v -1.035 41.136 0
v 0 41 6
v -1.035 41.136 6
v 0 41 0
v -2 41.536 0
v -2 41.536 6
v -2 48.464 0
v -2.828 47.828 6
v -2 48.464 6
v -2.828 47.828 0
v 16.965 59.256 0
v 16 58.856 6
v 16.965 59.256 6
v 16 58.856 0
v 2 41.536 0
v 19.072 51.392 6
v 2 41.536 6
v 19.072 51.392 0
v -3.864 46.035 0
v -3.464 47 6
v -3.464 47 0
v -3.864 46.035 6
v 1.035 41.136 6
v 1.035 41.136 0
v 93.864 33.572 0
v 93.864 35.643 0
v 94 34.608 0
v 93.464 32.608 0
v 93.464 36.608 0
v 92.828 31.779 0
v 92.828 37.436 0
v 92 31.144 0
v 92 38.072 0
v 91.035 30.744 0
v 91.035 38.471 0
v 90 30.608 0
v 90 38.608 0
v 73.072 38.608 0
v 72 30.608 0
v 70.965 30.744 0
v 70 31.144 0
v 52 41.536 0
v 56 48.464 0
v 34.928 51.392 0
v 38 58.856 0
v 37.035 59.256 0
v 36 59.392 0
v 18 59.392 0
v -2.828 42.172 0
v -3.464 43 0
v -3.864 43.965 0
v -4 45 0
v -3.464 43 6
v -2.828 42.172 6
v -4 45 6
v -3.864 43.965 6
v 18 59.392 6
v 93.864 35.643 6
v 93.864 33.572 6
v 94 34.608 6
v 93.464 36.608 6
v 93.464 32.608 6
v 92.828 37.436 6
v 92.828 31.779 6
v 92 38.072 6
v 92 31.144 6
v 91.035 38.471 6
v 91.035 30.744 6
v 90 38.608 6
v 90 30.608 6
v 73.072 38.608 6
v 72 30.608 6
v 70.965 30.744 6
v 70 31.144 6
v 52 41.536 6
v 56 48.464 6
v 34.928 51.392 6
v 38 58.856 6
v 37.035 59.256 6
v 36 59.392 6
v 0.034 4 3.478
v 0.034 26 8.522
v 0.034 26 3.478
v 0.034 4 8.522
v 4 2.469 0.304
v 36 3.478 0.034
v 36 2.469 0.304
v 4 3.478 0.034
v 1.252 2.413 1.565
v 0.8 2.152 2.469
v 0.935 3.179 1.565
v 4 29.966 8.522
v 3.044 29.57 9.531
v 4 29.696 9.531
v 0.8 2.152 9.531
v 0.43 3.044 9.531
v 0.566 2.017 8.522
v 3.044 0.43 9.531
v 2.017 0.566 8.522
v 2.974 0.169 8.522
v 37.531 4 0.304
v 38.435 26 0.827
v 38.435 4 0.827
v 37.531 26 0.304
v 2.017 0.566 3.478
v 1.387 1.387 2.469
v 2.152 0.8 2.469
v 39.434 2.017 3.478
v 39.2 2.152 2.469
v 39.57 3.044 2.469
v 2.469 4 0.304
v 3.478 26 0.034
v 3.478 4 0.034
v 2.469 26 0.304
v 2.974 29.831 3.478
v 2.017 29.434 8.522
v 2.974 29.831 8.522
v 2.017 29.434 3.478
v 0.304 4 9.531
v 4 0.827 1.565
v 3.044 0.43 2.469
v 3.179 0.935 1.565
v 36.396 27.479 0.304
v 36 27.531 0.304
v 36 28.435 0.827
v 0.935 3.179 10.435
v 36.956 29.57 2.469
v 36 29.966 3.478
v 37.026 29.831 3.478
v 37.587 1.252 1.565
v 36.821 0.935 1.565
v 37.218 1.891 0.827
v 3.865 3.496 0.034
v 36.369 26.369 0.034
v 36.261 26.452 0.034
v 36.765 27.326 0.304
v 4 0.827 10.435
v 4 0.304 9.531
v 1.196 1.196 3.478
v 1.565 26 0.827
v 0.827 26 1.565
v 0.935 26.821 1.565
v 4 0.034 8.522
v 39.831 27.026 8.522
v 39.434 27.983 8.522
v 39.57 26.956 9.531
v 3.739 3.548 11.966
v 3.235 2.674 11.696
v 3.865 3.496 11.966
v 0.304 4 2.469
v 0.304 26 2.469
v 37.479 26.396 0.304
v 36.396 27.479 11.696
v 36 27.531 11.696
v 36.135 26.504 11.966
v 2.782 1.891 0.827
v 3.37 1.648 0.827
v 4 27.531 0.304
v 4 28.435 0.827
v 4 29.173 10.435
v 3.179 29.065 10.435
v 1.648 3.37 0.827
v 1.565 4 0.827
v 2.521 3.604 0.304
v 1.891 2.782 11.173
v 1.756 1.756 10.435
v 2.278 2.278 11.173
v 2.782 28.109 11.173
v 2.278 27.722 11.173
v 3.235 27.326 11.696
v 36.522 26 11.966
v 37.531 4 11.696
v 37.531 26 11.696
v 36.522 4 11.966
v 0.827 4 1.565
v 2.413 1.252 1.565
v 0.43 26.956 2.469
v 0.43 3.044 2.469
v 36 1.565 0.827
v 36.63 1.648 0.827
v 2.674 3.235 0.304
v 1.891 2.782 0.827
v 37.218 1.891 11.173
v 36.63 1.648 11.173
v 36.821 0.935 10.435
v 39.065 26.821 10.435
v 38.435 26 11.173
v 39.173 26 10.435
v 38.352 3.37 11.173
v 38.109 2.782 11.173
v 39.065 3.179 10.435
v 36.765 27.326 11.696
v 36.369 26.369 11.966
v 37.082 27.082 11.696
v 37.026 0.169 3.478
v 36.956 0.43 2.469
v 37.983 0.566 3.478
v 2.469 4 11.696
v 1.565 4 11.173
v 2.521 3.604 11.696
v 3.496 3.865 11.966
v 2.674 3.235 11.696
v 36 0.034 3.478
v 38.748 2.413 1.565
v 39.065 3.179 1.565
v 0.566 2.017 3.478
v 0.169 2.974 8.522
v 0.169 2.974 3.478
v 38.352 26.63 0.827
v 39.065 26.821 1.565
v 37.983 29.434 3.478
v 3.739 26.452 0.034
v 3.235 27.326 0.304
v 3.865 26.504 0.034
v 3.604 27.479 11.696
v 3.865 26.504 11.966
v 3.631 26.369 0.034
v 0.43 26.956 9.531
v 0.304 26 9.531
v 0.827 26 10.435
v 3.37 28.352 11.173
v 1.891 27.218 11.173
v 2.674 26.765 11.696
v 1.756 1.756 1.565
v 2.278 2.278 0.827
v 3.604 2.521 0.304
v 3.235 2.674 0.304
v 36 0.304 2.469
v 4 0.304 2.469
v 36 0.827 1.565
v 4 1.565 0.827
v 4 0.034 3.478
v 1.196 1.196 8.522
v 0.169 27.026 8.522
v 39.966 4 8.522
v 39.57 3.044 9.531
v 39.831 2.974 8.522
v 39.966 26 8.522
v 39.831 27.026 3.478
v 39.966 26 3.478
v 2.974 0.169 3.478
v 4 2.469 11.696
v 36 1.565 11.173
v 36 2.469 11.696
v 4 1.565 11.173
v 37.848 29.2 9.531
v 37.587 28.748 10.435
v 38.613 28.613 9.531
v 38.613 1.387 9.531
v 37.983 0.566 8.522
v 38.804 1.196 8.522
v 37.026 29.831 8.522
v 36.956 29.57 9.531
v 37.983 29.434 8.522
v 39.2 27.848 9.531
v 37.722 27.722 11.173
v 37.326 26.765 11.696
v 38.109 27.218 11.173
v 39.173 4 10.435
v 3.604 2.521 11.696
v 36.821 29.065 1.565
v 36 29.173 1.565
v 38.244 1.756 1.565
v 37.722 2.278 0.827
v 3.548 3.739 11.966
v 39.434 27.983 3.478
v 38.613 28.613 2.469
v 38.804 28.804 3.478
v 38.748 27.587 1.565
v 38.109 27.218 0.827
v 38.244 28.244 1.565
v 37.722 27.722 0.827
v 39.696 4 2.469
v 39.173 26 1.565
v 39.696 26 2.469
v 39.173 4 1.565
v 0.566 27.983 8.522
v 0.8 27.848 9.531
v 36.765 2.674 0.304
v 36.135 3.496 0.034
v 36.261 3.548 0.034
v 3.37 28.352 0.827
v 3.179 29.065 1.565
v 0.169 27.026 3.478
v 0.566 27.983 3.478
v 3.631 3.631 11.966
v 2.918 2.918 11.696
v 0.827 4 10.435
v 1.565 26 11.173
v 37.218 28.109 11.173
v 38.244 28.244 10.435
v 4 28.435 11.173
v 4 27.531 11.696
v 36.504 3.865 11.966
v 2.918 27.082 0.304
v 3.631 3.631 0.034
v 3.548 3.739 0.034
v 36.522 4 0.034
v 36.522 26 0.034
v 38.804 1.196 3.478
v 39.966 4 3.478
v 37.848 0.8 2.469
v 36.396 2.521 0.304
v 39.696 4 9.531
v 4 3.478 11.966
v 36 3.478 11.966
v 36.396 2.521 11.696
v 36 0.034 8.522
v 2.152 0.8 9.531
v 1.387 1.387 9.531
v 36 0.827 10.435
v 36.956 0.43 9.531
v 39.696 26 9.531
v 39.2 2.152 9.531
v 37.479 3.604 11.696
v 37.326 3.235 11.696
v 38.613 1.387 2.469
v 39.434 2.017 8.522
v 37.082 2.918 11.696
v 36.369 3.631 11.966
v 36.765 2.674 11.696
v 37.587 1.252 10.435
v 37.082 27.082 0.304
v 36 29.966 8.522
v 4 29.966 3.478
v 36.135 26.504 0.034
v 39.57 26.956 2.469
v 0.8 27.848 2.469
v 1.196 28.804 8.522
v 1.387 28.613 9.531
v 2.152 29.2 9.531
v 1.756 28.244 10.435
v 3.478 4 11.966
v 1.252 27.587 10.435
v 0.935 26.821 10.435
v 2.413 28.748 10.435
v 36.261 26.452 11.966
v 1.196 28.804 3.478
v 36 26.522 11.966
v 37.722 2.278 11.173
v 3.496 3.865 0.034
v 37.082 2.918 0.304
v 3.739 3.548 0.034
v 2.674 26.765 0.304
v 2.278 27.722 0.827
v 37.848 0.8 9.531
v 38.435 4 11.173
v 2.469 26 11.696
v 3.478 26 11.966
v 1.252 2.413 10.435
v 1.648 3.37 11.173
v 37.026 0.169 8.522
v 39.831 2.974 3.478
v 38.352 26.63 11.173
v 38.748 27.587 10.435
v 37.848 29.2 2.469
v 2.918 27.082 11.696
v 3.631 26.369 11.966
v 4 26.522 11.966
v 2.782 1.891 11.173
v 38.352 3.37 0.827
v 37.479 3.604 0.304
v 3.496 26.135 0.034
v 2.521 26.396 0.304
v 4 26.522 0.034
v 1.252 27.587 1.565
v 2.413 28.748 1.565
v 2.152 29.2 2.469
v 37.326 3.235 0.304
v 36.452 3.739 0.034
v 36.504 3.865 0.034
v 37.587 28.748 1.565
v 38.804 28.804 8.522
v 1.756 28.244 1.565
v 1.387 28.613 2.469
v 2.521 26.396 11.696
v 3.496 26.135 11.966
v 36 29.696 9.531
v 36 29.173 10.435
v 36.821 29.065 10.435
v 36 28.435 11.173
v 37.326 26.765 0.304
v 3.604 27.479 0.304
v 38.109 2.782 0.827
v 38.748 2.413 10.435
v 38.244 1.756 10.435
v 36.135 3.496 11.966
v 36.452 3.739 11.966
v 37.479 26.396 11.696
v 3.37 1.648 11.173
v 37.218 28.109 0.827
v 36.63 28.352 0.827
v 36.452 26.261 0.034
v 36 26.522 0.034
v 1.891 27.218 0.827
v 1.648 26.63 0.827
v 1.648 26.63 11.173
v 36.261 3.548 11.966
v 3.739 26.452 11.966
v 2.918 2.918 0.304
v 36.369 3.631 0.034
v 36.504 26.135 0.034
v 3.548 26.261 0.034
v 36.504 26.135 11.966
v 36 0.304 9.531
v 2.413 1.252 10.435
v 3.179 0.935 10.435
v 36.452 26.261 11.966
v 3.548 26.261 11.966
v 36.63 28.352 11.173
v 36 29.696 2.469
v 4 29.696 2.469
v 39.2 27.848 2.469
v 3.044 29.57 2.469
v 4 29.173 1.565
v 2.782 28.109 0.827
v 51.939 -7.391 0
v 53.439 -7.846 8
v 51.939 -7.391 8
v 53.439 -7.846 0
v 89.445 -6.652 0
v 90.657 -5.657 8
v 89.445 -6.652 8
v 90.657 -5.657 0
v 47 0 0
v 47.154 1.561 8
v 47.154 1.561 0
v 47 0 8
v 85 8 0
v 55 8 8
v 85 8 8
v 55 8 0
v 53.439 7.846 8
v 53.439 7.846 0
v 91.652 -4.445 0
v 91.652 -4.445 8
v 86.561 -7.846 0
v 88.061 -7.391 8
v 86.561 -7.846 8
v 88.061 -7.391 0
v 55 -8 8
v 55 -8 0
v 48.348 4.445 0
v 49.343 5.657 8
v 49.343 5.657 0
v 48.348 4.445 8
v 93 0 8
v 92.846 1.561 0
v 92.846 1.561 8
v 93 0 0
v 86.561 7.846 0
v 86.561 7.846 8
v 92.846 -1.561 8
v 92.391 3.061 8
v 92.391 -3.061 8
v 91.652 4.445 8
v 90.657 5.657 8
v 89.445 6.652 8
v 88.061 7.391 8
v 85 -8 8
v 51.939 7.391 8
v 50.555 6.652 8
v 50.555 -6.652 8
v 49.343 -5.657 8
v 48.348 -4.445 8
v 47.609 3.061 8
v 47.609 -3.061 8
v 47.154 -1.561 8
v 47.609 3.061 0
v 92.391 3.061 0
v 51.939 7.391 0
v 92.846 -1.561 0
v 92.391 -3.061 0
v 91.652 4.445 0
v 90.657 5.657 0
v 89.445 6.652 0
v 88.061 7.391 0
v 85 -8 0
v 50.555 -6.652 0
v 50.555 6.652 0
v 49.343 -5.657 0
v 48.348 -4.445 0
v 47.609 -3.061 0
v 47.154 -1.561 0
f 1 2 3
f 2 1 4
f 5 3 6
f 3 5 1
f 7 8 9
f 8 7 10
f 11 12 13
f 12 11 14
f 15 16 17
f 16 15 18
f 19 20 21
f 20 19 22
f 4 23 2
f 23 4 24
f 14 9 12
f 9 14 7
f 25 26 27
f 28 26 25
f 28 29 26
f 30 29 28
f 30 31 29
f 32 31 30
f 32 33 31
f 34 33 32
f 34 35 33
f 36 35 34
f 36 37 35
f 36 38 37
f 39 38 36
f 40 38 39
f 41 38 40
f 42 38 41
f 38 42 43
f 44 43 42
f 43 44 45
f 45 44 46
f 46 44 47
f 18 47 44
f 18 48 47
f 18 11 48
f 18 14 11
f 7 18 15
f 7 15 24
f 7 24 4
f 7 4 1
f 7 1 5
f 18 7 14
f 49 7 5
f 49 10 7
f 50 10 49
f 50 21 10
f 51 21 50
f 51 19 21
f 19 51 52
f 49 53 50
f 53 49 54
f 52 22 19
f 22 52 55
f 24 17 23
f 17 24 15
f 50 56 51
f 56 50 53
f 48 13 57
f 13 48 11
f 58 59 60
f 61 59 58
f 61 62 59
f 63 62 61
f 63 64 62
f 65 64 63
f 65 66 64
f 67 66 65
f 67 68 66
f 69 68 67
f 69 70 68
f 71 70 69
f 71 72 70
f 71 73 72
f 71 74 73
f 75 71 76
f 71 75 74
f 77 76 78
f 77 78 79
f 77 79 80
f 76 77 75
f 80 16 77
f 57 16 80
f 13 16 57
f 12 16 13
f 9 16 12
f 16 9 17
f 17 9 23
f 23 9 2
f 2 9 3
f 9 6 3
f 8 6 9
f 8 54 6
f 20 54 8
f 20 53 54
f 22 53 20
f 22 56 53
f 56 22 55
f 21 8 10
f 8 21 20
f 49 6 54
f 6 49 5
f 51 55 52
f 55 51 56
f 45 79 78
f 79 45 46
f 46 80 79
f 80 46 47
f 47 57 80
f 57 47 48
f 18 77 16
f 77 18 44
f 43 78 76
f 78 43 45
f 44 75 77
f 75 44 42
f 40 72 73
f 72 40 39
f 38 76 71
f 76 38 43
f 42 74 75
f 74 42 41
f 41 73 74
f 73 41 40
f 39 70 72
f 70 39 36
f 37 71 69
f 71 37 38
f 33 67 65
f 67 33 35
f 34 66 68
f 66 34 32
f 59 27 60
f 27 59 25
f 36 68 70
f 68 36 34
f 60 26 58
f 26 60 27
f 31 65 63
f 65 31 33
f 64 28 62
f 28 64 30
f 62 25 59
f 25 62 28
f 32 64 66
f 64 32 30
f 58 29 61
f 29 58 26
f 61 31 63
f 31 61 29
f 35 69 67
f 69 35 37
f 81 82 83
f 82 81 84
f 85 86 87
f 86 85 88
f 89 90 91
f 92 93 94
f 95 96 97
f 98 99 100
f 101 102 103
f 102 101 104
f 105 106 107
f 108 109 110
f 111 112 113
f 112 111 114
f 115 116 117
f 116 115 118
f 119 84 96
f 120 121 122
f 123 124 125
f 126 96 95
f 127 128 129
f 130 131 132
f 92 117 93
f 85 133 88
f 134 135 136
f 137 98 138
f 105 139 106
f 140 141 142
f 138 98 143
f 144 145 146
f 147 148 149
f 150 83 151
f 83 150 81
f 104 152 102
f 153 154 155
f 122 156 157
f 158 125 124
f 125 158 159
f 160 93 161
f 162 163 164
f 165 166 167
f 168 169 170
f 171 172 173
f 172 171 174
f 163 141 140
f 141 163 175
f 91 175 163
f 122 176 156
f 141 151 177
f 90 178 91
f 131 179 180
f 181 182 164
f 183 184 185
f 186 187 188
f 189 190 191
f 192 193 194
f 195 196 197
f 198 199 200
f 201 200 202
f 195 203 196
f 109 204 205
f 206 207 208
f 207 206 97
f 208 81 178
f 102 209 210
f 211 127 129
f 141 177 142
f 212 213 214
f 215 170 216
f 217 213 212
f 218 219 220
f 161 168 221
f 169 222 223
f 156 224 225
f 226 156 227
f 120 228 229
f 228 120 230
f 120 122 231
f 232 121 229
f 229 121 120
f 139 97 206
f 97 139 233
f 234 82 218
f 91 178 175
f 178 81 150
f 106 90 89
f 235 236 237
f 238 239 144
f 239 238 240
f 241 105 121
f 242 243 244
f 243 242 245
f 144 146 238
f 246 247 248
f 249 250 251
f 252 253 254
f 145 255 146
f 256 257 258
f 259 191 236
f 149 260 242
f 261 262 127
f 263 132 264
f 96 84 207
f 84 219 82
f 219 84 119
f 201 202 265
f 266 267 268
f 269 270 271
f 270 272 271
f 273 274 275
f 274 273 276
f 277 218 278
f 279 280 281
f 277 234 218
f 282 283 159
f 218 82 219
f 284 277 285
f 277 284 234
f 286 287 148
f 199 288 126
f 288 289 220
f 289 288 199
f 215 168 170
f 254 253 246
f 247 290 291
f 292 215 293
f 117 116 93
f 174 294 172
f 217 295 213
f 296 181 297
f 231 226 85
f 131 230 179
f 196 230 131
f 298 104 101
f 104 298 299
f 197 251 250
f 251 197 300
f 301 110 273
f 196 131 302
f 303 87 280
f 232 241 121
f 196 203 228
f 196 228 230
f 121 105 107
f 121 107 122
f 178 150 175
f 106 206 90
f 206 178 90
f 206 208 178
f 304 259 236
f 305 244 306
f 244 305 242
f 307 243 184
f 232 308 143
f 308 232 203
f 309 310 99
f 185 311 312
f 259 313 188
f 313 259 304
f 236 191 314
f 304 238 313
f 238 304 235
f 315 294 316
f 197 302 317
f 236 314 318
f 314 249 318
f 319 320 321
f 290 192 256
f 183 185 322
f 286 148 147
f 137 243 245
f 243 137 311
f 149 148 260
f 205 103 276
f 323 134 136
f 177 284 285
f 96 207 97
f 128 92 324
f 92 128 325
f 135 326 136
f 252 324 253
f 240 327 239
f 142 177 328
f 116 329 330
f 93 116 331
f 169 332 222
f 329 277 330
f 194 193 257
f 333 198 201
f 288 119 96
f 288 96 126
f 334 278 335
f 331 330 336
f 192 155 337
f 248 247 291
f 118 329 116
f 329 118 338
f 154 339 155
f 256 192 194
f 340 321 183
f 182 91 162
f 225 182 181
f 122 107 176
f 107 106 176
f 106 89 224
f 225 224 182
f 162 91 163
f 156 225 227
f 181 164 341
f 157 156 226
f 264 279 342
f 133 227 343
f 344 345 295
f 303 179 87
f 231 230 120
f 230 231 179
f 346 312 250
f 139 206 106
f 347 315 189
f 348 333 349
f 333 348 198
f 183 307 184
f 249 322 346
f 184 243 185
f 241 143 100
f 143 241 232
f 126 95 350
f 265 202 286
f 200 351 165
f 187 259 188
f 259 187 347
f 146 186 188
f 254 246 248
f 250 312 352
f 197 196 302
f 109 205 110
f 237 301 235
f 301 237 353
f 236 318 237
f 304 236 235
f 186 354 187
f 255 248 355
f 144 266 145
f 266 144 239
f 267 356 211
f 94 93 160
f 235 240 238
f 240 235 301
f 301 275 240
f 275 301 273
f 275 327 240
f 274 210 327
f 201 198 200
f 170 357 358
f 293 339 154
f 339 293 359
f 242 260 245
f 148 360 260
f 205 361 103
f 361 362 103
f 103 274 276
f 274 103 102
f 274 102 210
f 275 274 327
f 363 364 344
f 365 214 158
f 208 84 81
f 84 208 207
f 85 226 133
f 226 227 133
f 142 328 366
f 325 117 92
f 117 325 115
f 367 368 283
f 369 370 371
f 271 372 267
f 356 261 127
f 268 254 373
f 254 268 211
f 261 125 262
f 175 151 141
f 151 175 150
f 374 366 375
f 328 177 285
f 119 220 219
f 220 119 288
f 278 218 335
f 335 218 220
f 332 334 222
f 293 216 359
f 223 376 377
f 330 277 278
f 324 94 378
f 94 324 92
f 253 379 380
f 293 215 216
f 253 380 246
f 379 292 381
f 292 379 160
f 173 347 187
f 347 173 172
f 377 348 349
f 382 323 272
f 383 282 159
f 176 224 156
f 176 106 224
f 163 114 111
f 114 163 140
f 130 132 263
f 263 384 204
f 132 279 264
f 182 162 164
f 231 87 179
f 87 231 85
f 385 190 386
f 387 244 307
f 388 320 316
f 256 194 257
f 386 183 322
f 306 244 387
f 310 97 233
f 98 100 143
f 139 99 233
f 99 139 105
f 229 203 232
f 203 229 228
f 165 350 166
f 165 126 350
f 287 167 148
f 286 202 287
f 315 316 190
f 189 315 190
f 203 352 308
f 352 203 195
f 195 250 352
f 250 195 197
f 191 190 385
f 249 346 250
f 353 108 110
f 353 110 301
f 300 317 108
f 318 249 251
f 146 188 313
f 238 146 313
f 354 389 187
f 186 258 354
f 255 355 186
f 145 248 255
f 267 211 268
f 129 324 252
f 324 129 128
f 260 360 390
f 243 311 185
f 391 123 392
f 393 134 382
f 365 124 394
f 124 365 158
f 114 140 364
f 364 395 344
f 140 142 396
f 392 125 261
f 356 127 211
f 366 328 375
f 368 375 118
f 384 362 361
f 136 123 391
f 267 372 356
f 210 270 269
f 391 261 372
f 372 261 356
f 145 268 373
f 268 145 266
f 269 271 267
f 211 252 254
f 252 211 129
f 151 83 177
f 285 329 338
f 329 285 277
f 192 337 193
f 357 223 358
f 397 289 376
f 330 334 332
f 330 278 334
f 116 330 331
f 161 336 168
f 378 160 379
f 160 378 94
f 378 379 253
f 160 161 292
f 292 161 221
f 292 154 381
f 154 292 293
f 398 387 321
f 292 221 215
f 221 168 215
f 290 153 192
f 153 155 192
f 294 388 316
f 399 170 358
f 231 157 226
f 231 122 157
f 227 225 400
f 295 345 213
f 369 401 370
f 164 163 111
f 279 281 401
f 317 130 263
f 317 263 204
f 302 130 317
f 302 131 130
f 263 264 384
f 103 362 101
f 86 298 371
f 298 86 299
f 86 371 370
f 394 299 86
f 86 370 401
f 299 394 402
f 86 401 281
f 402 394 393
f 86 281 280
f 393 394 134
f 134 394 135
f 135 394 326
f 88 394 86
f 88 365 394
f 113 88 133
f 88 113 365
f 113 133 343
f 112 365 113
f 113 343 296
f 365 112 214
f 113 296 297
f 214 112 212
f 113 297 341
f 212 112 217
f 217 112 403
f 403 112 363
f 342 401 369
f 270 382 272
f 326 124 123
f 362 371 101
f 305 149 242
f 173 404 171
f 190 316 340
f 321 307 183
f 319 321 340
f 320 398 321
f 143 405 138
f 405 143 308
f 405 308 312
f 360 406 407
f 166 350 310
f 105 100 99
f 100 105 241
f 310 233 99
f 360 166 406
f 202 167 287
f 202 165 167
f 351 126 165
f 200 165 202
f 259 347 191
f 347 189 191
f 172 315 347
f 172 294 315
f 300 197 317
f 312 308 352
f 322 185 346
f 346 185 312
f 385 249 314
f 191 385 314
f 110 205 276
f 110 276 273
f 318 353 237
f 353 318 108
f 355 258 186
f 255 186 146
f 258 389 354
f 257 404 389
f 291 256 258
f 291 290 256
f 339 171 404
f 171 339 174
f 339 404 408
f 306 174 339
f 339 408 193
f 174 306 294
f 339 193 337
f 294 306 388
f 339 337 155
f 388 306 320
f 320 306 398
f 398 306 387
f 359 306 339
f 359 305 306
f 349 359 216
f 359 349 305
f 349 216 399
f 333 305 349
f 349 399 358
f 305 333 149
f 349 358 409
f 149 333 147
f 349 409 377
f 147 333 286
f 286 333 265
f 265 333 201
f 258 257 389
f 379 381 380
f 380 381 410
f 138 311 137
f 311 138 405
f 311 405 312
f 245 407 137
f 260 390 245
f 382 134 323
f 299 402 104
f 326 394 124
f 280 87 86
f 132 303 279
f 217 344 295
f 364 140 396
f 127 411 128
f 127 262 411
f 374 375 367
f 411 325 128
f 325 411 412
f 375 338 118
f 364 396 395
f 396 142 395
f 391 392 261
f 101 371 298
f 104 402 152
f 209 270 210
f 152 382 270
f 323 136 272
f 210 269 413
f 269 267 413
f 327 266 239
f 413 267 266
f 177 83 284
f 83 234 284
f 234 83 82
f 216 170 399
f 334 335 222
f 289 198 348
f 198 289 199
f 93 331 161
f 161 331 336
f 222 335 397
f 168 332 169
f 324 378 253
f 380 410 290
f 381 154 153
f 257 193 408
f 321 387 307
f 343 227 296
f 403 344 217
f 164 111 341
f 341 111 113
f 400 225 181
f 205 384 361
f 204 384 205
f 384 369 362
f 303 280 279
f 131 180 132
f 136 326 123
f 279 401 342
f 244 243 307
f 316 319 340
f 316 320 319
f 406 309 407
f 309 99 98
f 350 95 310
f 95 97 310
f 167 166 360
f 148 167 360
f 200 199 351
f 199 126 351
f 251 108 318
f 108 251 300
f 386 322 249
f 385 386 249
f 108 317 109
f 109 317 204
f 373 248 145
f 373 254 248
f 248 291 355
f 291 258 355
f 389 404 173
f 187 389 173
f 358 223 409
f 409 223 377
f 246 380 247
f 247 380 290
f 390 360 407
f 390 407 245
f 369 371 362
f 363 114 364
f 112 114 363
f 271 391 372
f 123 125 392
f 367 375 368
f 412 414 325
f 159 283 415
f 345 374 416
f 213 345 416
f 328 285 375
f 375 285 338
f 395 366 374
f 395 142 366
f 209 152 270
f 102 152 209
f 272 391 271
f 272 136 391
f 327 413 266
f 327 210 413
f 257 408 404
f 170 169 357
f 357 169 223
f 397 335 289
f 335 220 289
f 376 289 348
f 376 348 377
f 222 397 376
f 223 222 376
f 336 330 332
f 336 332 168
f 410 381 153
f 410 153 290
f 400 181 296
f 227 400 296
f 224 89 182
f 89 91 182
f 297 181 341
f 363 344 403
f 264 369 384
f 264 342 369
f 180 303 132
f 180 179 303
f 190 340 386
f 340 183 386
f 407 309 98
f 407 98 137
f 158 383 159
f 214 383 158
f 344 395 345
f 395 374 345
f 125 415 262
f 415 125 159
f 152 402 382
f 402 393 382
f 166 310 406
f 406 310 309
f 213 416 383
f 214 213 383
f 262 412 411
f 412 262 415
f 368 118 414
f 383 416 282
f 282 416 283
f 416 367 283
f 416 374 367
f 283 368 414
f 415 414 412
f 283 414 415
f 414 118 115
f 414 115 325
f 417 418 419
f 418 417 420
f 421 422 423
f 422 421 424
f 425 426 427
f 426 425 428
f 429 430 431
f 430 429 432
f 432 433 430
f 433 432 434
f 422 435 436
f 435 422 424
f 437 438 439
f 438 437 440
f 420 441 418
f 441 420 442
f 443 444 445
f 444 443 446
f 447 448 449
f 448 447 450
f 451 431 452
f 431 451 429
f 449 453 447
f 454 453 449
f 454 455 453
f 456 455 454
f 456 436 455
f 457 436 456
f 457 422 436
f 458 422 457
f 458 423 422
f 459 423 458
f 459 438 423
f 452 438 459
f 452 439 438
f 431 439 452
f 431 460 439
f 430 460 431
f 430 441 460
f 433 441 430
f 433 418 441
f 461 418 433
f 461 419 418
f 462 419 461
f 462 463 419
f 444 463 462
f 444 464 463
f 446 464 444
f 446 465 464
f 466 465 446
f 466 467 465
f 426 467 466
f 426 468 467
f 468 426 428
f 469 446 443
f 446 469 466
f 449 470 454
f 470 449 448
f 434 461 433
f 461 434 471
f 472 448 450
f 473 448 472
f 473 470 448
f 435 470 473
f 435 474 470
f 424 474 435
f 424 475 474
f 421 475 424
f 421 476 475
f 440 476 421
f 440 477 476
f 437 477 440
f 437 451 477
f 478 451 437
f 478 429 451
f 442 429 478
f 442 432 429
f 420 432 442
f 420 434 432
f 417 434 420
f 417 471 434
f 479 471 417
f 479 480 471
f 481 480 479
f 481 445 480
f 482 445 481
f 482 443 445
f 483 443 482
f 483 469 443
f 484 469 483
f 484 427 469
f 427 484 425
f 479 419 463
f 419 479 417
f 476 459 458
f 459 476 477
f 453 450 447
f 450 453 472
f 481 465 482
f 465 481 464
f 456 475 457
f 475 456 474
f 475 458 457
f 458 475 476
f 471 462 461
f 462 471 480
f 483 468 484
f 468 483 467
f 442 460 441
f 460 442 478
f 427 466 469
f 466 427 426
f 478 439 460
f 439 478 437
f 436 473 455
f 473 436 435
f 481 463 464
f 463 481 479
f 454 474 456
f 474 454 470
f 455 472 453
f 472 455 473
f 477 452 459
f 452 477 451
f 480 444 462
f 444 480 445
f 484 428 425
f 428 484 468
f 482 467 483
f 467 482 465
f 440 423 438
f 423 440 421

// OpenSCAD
// hull(): the tightest convex shell around its children.
//
// Nothing concave survives it, which is the point: a few small shapes
// become one smooth body.

// A rounded slab, from eight corner spheres.
module rounded_box(size, r) {
    hull()
        for (x = [r, size[0] - r], y = [r, size[1] - r], z = [r, size[2] - r])
            translate([x, y, z]) sphere(r, $fn=24);
}
rounded_box([40, 30, 12], 4);

// A stadium: two circles, one hull.
translate([55, 0, 0]) linear_extrude(8)
    hull() {
        circle(8, $fn=32);
        translate([30, 0]) circle(8, $fn=32);
    }

// Hulling each neighboring pair, rather than all at once, follows a
// path instead of swallowing it.
translate([0, 45, 0]) {
    pts = [for (i = [0:5]) [i * 18, 12 * sin(i * 60)]];
    for (i = [0 : len(pts) - 2])
        hull() {
            translate(pts[i])     cylinder(h=6, r=4, $fn=24);
            translate(pts[i + 1]) cylinder(h=6, r=4, $fn=24);
        }
}
